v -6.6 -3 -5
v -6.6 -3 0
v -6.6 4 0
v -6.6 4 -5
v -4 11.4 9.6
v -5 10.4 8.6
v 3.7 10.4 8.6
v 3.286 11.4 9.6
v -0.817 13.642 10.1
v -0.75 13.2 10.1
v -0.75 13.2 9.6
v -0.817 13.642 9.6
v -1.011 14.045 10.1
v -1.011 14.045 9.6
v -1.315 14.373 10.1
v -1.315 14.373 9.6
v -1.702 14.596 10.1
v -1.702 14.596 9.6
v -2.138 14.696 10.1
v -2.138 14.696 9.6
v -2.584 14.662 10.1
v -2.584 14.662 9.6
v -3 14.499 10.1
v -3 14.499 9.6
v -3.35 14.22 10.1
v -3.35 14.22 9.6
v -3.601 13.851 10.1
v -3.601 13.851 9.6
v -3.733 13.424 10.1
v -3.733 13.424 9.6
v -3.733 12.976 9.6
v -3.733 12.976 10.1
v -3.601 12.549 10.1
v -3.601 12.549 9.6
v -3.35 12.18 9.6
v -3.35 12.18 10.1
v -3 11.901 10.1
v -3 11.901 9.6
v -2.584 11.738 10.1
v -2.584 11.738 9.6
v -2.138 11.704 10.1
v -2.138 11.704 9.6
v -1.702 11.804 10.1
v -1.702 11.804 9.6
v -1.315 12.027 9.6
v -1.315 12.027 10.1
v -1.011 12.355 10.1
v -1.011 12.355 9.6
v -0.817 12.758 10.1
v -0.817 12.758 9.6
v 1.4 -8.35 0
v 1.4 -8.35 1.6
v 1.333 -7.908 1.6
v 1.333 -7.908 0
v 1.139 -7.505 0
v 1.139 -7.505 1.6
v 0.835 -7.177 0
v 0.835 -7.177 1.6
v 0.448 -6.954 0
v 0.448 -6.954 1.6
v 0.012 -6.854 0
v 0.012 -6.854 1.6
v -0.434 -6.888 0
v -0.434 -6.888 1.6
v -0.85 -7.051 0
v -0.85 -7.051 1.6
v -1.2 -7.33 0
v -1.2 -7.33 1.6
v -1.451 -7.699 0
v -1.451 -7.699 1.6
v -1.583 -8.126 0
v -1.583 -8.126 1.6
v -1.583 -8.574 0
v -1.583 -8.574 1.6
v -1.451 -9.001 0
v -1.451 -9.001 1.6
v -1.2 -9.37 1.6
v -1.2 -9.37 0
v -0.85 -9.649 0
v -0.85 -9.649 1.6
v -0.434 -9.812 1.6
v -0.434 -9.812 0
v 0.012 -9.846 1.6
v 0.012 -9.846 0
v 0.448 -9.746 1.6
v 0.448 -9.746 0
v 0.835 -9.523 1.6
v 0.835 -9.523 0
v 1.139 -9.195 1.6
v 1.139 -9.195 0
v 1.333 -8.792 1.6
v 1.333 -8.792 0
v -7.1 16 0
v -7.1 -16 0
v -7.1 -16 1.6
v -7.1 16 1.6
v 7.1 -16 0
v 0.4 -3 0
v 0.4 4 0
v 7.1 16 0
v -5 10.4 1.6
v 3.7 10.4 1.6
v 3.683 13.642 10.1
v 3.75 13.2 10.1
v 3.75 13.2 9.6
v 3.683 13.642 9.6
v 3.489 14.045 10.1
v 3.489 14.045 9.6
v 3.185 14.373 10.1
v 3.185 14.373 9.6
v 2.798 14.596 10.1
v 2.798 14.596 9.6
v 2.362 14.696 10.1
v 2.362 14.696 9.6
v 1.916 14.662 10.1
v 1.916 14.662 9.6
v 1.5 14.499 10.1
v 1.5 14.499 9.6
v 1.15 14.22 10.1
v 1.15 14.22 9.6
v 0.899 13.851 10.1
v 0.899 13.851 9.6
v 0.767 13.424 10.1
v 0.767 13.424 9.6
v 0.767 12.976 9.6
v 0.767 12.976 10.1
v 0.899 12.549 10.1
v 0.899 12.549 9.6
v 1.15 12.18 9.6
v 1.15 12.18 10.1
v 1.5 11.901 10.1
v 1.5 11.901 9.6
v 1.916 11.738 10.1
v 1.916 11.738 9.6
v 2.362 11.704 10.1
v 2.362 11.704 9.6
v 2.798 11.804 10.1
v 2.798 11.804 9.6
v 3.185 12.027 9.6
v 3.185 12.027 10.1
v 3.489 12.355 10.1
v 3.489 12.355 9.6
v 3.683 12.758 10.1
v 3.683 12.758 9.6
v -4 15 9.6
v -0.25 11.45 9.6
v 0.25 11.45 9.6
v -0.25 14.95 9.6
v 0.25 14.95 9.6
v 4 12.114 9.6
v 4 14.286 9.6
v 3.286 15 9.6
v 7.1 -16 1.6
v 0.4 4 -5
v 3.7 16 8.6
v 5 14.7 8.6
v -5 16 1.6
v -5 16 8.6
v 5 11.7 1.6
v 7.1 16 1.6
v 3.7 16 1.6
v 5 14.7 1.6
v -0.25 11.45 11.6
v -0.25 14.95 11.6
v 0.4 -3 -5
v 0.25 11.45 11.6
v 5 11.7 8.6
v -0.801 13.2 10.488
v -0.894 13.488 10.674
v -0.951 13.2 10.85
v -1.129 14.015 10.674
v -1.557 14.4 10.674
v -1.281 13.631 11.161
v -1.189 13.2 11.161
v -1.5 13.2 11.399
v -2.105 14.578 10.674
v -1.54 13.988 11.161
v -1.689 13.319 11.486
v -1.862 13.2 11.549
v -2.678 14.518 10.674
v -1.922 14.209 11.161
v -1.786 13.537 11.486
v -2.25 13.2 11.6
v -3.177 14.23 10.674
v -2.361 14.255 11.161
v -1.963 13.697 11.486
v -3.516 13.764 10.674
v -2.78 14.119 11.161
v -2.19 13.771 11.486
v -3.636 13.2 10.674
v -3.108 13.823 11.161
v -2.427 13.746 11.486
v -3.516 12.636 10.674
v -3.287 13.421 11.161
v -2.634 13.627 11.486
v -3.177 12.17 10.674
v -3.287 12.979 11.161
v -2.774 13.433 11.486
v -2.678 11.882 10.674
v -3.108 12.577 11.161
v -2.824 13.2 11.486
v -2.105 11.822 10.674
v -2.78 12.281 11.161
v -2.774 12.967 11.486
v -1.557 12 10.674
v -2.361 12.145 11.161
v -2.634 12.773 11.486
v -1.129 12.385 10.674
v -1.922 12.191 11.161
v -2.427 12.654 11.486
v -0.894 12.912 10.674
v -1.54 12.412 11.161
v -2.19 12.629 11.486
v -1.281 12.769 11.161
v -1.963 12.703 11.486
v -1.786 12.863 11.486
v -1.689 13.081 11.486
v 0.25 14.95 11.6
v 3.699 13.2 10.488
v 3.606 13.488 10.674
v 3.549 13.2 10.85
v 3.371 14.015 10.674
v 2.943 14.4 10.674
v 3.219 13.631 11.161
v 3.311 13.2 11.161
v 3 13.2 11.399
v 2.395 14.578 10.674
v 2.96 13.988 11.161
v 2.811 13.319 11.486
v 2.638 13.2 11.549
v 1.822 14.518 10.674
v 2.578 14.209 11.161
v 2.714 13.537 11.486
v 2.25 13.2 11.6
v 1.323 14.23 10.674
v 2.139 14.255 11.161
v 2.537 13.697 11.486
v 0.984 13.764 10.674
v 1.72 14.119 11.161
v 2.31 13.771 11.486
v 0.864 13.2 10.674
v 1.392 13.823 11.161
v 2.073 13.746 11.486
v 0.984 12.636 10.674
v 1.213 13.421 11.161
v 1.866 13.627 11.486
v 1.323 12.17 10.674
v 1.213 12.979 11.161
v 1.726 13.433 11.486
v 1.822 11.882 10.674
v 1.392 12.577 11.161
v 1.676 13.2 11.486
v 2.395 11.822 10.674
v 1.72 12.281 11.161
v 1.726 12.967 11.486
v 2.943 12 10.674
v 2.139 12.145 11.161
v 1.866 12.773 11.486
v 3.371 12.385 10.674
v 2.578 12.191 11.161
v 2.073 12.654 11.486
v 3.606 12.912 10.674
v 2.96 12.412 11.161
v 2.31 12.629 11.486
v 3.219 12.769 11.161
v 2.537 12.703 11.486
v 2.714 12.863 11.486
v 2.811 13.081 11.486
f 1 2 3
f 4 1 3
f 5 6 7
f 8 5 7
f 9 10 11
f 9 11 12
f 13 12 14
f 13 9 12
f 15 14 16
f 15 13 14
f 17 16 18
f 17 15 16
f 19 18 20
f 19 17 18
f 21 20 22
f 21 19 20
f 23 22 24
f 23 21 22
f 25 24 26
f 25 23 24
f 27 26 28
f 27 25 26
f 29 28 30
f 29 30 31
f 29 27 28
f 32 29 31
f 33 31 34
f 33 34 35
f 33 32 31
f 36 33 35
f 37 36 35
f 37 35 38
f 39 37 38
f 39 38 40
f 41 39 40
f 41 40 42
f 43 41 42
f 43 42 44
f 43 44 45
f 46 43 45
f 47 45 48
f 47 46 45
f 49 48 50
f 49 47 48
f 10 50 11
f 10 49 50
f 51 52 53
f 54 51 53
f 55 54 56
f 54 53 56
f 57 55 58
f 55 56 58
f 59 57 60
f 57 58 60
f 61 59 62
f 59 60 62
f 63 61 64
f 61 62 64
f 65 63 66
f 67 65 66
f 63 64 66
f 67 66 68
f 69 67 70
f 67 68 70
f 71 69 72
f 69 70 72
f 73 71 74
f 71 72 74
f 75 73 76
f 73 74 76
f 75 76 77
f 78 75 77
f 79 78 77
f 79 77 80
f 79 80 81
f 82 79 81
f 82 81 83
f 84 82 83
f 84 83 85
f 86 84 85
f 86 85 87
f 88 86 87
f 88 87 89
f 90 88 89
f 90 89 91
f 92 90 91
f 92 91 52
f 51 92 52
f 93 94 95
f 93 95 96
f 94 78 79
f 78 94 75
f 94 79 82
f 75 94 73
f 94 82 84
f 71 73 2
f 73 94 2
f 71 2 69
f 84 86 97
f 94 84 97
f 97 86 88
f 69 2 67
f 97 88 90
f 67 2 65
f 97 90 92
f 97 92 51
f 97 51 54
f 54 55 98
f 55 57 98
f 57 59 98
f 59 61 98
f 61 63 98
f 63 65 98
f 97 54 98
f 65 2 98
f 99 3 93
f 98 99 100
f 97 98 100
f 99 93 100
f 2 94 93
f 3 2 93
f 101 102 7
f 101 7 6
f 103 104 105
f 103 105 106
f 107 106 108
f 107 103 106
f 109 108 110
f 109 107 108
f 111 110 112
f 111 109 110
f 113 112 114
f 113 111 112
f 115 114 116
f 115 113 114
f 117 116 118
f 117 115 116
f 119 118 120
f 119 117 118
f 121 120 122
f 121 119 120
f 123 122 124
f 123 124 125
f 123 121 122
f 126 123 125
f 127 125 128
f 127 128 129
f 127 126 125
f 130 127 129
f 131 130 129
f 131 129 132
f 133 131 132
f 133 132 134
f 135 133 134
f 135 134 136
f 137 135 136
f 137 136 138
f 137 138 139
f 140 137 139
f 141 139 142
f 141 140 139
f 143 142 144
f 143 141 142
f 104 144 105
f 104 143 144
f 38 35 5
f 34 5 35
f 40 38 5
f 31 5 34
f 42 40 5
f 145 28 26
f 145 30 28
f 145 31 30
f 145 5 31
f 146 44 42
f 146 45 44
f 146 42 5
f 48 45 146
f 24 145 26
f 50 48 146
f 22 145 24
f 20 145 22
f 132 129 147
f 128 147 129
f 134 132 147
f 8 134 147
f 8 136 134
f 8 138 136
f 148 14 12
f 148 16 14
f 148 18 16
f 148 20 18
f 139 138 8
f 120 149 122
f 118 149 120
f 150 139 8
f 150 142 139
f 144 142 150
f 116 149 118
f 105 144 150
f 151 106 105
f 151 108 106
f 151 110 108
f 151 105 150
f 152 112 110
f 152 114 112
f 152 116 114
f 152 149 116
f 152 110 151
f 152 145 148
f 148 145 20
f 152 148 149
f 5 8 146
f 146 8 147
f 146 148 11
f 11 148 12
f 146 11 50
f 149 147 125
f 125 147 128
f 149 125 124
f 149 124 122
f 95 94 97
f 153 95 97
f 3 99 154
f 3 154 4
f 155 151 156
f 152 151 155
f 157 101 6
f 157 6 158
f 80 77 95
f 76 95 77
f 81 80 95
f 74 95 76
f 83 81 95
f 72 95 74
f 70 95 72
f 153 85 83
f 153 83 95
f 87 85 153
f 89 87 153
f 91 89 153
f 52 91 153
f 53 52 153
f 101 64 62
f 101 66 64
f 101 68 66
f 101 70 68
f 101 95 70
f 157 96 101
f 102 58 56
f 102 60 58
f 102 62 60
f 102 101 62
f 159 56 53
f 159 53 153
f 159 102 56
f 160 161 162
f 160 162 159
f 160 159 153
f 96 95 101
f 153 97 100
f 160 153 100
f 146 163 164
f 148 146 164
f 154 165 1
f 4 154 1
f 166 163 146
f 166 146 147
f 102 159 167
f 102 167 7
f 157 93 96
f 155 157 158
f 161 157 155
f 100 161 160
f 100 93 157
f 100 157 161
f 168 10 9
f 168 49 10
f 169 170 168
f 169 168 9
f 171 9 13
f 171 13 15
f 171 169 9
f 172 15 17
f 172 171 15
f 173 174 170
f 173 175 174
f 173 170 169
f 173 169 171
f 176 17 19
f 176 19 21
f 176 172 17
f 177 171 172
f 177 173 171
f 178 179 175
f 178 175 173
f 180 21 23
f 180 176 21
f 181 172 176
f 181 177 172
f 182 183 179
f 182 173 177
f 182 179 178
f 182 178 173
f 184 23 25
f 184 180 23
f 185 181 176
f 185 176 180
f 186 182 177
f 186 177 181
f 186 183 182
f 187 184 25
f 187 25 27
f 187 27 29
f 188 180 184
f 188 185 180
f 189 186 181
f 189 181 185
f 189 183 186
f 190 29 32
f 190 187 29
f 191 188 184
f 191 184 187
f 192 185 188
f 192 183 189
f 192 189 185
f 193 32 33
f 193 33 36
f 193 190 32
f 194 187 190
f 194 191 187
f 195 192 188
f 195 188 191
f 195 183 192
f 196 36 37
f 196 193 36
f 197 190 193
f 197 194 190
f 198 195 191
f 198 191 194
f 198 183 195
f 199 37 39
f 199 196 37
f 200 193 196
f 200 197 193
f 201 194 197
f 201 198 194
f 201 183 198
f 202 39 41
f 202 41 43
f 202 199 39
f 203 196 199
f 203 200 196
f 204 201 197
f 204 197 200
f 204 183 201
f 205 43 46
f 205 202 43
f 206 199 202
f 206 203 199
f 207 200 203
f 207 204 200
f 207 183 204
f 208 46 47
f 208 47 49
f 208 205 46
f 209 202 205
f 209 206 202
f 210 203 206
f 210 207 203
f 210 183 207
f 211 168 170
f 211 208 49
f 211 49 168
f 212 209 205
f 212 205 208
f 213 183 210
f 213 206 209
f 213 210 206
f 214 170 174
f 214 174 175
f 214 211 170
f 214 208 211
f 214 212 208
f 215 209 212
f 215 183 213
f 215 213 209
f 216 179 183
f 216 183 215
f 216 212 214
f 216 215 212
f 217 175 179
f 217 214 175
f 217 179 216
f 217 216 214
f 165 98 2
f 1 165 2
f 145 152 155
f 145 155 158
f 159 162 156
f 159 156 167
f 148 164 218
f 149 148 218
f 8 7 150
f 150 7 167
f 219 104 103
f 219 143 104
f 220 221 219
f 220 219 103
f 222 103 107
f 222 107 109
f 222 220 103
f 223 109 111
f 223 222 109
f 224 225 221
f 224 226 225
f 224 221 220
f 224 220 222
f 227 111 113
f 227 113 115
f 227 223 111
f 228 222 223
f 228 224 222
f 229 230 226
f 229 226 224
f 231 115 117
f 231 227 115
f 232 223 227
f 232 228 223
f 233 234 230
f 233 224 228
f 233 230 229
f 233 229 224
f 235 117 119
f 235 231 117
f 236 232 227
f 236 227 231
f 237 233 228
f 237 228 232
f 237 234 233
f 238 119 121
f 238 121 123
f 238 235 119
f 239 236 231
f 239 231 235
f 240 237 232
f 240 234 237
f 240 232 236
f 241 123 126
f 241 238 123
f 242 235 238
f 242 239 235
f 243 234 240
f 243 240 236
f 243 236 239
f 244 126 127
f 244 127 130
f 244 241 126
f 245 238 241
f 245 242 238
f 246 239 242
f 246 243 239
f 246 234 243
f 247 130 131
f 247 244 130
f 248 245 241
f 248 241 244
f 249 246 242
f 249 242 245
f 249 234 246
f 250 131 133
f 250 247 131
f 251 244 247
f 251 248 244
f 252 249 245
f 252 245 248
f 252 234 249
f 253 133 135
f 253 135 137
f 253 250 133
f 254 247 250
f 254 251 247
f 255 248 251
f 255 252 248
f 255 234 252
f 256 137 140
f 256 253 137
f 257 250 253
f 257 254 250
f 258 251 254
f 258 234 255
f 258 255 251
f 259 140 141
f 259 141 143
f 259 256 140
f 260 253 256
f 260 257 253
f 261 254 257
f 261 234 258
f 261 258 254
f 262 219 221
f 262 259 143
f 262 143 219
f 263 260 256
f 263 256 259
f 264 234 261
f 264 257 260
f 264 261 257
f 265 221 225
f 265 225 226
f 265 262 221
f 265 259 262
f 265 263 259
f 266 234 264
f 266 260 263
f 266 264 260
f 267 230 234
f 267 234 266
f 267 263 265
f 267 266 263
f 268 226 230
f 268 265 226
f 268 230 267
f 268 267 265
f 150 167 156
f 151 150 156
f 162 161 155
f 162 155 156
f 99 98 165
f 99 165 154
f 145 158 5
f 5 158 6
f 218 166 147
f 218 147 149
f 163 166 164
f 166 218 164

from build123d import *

# Parameters (mm, degrees)
CROQUIS1_W              = 14.2
CROQUIS1_H              = 32
SALIENTE_EXTRUIR1_DEPTH = 1.6
CROQUIS2_R              = 1.5
CORTAR_EXTRUIR1_DEPTH   = 18.57754249
SALIENTE_EXTRUIR2_DEPTH = 10
CROQUIS4_R              = 1.5
CROQUIS4_W              = 0.5
CROQUIS4_H              = 3.5
CORTAR_EXTRUIR2_DEPTH   = 2
CHAFL_N1_SIZE           = 1
REDONDEO1_R             = 1.5
CROQUIS5_W              = 7
CROQUIS5_H              = 7
SALIENTE_EXTRUIR3_DEPTH = 5


with BuildPart() as part:
    # Croquis1 → Saliente-Extruir1 (new body)
    with BuildSketch(Plane.XY):
        Rectangle(CROQUIS1_W, CROQUIS1_H)
    extrude(amount=SALIENTE_EXTRUIR1_DEPTH)

    # Croquis2 → Cortar-Extruir1 (cut, through all)
    with BuildSketch(Plane.XY.offset(1.6)):
        with Locations((-0.1, -8.35)):
            Circle(CROQUIS2_R)
    extrude(amount=-CORTAR_EXTRUIR1_DEPTH, mode=Mode.SUBTRACT)

    # Croquis3 → Saliente-Extruir2 (add)
    with BuildSketch(Plane.XY.offset(1.6)):
        Polygon((-5, 16), (3.7, 16), (5, 14.7), (5, 11.7), (3.7, 10.4), (-5, 10.4), align=None)
    extrude(amount=SALIENTE_EXTRUIR2_DEPTH)

    # Croquis4 → Cortar-Extruir2 (cut)
    with BuildSketch(Plane.XY.offset(11.6)):
        Polygon((-5, 10.4), (3.7, 10.4), (5, 11.7), (5, 14.7), (3.7, 16), (-5, 16), align=None)
        with Locations((-2.25, 13.2)):
            Circle(CROQUIS4_R, mode=Mode.SUBTRACT)
        with Locations((2.25, 13.2)):
            Circle(CROQUIS4_R, mode=Mode.SUBTRACT)
        with Locations((0, 13.2)):
            Rectangle(CROQUIS4_W, CROQUIS4_H, mode=Mode.SUBTRACT)
    extrude(amount=-CORTAR_EXTRUIR2_DEPTH, mode=Mode.SUBTRACT)

    # Chaflán1
    chafl_n1_edges = [part.edges().sort_by_distance(p)[0] for p in [
        (4.35, 15.35, 9.6),
        (5, 13.2, 9.6),
        (4.35, 11.05, 9.6),
        (-0.65, 10.4, 9.6),
        (-5, 13.2, 9.6),
        (-0.65, 16, 9.6),
    ]]
    chamfer(chafl_n1_edges, length=CHAFL_N1_SIZE)

    # Redondeo1
    redondeo1_edges = [part.edges().sort_by_distance(p)[0] for p in [
        (-3.75, 13.2, 11.6),
        (0.75, 13.2, 11.6),
    ]]
    fillet(redondeo1_edges, radius=REDONDEO1_R)

    # Croquis5 → Saliente-Extruir3 (add)
    with BuildSketch(Plane(origin=(0, 0, 0), x_dir=(-1, 0, 0), z_dir=(0, 0, -1))):
        with Locations((3.1, 0.5)):
            Rectangle(CROQUIS5_W, CROQUIS5_H)
    extrude(amount=SALIENTE_EXTRUIR3_DEPTH)


solid = part.part
